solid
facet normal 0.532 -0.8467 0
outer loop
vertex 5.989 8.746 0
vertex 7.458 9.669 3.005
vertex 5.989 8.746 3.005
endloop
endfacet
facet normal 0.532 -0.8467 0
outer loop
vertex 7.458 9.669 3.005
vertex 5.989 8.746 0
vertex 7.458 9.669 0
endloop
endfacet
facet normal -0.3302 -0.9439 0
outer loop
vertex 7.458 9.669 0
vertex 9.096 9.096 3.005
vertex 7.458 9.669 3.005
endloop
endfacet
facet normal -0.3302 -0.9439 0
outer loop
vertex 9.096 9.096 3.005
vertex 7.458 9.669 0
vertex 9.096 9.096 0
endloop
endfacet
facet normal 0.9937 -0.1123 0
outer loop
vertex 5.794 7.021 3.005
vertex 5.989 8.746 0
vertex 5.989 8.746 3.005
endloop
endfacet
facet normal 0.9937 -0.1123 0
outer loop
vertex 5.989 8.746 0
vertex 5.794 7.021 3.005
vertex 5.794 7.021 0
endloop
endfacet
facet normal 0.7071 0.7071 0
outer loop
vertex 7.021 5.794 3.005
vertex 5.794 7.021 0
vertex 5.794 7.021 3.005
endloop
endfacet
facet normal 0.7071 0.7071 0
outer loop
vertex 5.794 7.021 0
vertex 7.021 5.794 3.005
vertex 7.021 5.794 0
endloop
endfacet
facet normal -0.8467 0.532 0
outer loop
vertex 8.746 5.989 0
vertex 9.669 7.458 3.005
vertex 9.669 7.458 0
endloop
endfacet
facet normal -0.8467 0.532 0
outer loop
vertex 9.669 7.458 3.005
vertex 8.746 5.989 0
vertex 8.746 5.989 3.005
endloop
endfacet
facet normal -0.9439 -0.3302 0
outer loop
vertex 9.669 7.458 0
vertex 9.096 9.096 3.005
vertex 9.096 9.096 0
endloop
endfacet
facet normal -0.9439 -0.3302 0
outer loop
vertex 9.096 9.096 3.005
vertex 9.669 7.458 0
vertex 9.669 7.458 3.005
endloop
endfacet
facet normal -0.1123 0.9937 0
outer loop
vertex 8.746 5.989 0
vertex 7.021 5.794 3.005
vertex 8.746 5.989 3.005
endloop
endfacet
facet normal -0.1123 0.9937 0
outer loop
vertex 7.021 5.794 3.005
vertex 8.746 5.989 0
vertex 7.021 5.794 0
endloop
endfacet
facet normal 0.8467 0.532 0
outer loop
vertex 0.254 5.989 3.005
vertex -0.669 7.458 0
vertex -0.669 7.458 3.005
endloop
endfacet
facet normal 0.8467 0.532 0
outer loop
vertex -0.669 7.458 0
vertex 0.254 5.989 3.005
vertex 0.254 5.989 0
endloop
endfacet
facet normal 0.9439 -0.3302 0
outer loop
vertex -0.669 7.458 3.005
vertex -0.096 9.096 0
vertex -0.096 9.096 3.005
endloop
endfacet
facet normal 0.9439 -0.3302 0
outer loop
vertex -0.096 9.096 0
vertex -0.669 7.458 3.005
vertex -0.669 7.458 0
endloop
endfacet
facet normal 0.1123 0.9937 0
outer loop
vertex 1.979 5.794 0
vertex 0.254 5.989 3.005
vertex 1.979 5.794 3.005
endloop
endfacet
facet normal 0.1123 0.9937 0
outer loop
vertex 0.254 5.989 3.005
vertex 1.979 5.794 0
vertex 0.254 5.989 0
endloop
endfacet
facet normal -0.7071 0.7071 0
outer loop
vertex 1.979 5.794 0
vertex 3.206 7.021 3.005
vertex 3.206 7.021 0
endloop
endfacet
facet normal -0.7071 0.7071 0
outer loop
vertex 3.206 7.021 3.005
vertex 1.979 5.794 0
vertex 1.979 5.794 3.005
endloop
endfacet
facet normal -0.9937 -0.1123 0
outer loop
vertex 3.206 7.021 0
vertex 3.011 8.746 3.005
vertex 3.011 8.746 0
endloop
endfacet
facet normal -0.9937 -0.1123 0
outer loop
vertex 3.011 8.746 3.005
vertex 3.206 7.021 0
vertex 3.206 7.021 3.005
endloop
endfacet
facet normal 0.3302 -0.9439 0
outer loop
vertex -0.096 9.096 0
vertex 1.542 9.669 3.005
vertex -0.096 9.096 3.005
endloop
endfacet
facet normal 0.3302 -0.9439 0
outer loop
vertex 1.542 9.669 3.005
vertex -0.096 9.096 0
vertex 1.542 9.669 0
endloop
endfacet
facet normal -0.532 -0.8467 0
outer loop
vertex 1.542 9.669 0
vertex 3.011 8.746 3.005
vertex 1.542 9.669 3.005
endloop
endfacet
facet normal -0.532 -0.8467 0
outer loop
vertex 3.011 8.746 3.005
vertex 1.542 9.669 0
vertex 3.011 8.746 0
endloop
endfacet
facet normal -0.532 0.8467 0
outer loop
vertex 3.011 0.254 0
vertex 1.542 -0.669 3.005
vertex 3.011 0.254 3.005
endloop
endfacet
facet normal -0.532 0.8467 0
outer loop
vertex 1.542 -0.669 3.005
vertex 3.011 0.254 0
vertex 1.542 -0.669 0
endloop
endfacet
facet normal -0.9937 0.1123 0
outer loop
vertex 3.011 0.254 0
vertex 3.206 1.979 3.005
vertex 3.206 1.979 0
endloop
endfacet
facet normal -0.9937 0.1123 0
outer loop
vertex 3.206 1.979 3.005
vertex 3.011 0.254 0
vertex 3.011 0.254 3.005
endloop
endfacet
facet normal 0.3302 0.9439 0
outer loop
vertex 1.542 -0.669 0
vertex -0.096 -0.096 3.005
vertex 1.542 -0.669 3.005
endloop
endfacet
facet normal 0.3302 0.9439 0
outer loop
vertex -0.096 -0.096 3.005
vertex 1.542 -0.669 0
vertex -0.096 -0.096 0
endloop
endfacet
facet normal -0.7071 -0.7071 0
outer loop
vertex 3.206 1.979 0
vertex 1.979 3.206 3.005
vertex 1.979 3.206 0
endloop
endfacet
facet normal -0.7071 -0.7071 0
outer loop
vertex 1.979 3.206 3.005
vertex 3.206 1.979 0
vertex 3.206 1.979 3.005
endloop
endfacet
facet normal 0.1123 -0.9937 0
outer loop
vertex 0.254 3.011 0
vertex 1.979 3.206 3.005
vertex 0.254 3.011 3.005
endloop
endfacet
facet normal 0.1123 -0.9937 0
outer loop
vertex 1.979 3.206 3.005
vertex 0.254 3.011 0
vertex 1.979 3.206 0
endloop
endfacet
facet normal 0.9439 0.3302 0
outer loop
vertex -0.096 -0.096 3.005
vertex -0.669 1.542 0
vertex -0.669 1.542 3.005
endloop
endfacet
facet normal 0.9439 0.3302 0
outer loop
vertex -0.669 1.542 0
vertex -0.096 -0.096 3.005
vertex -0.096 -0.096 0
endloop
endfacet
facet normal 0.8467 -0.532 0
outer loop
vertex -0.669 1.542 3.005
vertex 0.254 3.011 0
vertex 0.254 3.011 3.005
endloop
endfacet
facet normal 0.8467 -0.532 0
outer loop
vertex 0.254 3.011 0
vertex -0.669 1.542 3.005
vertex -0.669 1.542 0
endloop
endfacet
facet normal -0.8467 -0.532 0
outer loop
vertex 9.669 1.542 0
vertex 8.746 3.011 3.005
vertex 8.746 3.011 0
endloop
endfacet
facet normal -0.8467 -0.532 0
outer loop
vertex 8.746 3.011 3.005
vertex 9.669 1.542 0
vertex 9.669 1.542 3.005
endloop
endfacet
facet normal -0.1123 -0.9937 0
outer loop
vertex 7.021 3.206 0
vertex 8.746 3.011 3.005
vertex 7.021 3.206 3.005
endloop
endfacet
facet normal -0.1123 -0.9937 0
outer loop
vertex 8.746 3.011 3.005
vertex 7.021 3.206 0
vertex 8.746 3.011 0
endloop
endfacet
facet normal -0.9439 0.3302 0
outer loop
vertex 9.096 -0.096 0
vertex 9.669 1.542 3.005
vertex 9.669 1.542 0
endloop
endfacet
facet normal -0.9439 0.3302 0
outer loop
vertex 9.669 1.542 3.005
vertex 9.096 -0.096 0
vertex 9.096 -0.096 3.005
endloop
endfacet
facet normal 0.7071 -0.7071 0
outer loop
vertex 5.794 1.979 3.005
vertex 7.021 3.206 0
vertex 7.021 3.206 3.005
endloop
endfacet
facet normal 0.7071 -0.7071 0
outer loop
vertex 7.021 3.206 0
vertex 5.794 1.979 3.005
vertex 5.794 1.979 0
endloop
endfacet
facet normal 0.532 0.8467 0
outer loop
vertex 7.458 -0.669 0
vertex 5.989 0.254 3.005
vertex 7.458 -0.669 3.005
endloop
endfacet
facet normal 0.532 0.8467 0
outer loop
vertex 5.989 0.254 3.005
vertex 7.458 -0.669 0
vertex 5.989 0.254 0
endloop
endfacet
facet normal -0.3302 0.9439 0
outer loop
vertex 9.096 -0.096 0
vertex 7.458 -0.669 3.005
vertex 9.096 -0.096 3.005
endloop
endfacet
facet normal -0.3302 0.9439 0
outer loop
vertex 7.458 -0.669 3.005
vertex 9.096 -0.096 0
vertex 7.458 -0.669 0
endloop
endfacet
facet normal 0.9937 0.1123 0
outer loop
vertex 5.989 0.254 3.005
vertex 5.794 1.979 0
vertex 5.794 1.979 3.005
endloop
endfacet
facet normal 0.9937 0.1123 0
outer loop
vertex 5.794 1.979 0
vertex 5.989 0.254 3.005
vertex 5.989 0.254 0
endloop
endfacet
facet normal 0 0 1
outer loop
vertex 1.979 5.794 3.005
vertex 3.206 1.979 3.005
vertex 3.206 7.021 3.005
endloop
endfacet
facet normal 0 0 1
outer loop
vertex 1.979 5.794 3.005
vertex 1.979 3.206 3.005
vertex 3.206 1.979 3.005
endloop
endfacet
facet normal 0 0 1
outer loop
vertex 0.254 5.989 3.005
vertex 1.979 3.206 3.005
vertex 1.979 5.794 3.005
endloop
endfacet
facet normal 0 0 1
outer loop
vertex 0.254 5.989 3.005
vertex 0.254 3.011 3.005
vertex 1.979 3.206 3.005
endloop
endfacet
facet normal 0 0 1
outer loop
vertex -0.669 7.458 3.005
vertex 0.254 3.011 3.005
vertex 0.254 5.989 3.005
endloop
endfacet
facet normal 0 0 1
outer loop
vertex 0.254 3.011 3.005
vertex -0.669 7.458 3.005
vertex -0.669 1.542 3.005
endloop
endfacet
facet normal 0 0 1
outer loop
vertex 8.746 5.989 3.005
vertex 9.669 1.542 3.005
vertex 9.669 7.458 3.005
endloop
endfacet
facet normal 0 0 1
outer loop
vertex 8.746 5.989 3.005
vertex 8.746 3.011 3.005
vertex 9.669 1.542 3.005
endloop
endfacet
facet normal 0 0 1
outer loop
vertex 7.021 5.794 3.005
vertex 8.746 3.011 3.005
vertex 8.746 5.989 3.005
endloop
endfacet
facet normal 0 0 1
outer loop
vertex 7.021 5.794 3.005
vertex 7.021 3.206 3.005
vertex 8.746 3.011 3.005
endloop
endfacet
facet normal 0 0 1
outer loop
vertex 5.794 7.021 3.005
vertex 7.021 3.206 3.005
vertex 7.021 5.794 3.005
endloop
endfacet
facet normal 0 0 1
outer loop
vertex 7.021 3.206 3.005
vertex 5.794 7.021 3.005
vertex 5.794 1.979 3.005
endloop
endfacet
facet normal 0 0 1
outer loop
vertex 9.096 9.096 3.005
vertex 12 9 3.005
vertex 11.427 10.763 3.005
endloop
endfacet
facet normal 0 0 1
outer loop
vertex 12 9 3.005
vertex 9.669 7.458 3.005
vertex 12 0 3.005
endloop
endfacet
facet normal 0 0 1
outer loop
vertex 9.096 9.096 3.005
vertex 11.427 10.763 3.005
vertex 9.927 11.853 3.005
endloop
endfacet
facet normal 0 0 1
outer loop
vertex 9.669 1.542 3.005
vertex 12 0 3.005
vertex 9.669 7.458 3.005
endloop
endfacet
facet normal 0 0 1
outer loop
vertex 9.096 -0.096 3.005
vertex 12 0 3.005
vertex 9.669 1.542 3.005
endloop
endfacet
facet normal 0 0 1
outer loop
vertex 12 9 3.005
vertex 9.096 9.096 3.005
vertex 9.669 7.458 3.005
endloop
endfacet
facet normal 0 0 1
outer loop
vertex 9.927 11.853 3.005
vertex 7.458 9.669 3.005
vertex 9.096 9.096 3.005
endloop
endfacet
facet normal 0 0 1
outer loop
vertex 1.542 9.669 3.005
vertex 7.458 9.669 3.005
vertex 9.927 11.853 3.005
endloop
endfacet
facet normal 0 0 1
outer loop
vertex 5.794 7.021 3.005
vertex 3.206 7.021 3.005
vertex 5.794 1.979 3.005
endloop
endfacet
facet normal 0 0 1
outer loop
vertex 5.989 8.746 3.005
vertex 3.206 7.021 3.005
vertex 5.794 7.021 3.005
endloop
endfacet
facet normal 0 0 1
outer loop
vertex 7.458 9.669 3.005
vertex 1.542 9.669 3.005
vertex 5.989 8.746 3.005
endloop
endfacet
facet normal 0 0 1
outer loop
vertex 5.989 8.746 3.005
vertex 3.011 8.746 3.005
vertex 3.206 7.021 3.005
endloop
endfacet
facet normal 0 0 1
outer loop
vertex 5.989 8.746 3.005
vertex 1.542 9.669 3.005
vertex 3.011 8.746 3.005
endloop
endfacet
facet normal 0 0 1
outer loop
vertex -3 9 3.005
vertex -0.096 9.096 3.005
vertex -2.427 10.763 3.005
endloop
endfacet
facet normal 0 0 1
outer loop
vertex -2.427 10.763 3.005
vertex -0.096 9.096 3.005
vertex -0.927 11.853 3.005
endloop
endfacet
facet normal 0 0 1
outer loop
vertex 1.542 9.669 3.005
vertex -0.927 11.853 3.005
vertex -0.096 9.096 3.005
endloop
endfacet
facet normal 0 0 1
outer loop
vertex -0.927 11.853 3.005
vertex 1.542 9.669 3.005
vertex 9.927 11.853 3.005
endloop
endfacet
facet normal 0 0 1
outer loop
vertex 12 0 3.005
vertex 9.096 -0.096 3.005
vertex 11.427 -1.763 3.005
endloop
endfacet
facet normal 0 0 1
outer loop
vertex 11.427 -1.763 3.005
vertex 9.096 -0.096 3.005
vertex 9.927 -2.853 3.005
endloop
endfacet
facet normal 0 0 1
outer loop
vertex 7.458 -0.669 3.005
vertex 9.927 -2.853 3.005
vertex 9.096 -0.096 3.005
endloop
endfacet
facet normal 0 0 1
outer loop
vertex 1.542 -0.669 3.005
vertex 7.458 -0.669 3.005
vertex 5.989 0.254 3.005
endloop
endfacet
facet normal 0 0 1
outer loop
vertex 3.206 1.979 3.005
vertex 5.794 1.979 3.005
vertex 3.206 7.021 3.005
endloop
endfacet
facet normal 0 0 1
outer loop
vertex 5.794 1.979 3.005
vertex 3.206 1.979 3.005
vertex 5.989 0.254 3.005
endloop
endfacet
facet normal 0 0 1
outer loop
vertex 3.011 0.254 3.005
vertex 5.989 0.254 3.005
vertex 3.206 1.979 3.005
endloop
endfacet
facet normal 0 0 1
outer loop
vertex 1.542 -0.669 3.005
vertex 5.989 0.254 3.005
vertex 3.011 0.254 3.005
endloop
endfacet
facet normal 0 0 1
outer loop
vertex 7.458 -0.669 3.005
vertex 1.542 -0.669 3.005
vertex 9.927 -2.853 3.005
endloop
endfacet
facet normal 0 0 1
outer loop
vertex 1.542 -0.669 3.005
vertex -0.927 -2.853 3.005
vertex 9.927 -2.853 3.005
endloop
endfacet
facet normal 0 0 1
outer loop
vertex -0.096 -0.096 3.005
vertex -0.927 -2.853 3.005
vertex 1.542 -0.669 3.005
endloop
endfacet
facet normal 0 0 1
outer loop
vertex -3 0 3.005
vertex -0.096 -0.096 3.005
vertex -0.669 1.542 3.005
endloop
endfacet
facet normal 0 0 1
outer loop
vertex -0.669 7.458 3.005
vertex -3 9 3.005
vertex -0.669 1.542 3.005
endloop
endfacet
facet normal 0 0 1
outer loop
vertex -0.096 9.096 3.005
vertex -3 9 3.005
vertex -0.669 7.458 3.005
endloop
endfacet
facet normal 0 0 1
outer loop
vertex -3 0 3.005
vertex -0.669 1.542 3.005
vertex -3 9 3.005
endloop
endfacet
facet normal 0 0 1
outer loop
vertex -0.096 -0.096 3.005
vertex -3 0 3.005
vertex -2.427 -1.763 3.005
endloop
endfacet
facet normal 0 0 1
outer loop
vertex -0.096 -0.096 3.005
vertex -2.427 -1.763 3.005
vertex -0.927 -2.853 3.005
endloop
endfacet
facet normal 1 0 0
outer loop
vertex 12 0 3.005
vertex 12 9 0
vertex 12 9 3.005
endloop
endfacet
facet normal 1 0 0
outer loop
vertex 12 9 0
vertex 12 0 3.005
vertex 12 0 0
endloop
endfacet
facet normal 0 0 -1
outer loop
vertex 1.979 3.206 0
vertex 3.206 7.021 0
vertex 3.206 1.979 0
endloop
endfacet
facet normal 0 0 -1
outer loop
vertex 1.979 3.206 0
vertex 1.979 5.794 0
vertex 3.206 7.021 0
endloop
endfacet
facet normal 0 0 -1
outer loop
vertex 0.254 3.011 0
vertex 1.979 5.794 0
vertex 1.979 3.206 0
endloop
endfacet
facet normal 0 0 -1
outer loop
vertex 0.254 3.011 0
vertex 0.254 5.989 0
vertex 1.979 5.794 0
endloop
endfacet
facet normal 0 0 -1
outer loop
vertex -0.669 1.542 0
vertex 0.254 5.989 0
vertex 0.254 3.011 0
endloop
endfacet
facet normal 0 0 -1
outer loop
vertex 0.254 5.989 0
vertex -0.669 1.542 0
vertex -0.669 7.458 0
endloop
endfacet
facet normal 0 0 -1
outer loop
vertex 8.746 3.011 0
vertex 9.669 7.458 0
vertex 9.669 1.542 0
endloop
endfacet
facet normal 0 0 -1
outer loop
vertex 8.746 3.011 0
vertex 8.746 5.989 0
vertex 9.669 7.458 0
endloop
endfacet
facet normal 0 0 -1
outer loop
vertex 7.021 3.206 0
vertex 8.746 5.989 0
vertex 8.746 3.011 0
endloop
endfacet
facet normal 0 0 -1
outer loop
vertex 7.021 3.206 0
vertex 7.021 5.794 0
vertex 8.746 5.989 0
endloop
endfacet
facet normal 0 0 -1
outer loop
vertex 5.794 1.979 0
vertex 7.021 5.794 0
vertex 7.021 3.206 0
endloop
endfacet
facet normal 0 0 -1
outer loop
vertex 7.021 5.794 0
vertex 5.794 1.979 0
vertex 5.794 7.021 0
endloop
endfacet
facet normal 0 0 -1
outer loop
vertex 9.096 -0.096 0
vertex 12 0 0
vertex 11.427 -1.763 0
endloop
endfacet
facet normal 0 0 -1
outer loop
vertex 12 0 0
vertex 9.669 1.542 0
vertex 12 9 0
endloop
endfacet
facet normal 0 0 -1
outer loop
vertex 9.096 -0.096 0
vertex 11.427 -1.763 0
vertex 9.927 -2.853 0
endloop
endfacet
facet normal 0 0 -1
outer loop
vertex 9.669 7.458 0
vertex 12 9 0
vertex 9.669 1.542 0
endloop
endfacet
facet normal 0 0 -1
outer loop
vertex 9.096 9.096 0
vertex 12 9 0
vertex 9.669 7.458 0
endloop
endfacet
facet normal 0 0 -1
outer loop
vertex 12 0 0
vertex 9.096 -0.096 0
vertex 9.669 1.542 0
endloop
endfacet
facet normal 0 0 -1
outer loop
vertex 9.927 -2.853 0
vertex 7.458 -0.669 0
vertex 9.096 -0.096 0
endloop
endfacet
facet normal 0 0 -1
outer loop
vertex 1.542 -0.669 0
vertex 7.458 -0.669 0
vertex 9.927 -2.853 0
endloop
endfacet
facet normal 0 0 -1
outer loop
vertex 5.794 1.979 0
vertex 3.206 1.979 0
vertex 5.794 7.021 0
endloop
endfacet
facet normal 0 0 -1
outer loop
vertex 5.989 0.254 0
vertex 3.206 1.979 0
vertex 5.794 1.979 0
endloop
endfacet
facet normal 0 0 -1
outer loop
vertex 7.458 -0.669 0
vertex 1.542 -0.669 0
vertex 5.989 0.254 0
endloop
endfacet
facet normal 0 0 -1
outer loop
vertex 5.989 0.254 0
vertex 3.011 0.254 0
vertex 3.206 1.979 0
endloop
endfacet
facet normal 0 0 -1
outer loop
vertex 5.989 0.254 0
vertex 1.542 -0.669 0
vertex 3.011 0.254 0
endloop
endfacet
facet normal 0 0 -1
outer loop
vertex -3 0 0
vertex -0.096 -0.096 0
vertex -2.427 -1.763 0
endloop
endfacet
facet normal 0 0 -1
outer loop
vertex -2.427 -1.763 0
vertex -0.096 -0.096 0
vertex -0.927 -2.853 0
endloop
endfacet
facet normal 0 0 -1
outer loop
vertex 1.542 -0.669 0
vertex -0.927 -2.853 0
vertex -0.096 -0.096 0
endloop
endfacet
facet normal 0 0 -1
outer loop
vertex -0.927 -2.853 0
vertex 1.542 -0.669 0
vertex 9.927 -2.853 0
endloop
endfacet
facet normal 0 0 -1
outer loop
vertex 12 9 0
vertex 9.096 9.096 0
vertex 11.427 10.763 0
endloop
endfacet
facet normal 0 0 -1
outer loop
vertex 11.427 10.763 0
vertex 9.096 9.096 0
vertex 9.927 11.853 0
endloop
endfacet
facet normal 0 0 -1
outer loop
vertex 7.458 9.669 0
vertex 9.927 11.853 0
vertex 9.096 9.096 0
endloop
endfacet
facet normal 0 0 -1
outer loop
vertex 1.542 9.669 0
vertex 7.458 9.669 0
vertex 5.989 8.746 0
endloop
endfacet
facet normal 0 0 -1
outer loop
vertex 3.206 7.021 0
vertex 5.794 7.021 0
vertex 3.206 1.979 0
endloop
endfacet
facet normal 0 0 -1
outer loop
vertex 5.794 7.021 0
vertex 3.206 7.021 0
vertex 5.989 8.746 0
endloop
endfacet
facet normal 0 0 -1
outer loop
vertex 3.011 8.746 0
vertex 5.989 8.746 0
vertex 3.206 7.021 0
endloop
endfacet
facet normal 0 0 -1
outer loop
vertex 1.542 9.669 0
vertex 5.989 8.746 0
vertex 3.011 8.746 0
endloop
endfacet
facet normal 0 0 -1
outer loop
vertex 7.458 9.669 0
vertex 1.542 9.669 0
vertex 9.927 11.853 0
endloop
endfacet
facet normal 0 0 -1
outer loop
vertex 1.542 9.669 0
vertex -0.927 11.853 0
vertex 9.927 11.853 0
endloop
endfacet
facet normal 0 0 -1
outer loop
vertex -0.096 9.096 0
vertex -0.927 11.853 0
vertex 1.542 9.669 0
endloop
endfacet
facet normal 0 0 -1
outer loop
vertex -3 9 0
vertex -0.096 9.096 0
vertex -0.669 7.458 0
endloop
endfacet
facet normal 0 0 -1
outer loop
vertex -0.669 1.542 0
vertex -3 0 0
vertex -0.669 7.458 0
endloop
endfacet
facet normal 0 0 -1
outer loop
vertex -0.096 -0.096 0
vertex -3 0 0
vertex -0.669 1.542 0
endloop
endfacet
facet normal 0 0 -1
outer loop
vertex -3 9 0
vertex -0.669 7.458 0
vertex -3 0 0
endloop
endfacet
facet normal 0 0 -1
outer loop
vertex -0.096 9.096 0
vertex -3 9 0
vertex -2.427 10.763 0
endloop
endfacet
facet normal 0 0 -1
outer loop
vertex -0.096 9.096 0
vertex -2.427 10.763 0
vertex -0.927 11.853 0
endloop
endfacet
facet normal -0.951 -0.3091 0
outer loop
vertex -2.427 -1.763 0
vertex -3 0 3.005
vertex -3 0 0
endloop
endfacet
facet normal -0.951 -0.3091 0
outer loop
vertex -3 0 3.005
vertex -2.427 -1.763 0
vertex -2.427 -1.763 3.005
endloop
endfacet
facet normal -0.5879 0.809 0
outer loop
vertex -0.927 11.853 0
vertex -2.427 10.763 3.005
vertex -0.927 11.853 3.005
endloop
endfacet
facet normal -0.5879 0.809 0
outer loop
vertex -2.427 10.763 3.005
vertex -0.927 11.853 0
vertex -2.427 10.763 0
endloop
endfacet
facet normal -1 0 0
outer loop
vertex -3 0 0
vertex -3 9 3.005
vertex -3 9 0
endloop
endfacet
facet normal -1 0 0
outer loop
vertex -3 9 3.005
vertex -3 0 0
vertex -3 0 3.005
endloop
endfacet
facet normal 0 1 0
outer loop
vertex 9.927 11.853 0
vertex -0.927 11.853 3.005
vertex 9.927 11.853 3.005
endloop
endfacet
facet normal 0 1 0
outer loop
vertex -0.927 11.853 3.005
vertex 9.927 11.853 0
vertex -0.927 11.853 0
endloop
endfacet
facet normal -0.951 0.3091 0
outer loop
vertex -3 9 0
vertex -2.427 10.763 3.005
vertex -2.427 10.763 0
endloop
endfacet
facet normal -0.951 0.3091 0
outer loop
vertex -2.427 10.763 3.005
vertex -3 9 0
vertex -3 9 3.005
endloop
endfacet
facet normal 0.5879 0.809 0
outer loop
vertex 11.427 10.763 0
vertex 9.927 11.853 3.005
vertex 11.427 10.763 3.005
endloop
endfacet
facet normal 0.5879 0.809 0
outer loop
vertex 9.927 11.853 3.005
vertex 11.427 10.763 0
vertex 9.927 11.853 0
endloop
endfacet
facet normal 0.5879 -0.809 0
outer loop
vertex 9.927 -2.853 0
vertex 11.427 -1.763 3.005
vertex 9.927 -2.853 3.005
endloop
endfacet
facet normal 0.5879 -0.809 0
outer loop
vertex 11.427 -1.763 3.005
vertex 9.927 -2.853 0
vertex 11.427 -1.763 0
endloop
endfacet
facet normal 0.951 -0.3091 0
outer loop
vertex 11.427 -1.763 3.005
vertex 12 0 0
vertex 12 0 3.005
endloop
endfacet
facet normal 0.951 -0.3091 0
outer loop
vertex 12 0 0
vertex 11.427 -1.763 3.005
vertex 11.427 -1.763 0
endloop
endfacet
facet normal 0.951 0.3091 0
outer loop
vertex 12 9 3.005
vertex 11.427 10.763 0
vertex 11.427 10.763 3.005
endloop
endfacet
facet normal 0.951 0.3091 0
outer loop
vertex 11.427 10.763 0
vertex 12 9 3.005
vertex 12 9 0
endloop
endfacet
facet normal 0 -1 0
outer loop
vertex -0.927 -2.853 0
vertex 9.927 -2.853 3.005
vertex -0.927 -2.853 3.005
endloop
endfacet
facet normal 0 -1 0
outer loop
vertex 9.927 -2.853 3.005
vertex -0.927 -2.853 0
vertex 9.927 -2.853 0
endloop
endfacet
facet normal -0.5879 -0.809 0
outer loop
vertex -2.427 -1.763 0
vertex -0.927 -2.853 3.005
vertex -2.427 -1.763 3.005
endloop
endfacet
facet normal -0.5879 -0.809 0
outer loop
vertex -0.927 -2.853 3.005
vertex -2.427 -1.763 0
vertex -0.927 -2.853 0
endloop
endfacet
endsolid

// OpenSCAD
// Brass Nut Mount for DIY Jack - see README.md for details.
// Author: Joseph M. Joy

function range(stop, start=0,  step=1) = [start: step: stop-1];
function range(start, stop, step) = [start: step: stop-1];

//module hexagon(base) = [[0,0], [0, base], [base, 0]];

base_thickness = 3;
base_width = 15;
base_corner_radius = 3; // For Minkowski corners
bolt_hole_dia = 4;
cylinder_dia = 10;
hex_bolt_dia = 5; // from corner to corner
hex_hole_dia = hex_bolt_dia + 1;
hex_bolt_height = 5;
EPSILON = 0.01;


// Create {n} bolt holes in a circle centered on ({x},{y}) and with radius r
// Bolt-hole radius is 2*bolt_hole_dia
module bolt_holes(x, y, r) {
    translate([x, y, -EPSILON ]) {
        for (a = range(45, 360, 90)) {
            rotate([0, 0, a]) translate([r, 0, 0])
                cylinder(base_thickness+2*EPSILON, r=bolt_hole_dia/2);

        }
    }
}

// base
module base() {
    reduced_width = base_width - 2*base_corner_radius;
    bolt_circle_radius = reduced_width/2;
    difference() {
        minkowski() {
                
                cube([reduced_width, reduced_width, base_thickness]);
                cylinder(EPSILON/2, r=base_corner_radius);
            }
        bolt_holes(reduced_width/2, reduced_width/2, bolt_circle_radius);
        }
}



module nut_mount() {
    base();
    //bolt_holes(0, 0, cylinder_dia, 4);
    //cylinder(base_thickness, r=bolt_hole_dia/2);
}

nut_mount();
